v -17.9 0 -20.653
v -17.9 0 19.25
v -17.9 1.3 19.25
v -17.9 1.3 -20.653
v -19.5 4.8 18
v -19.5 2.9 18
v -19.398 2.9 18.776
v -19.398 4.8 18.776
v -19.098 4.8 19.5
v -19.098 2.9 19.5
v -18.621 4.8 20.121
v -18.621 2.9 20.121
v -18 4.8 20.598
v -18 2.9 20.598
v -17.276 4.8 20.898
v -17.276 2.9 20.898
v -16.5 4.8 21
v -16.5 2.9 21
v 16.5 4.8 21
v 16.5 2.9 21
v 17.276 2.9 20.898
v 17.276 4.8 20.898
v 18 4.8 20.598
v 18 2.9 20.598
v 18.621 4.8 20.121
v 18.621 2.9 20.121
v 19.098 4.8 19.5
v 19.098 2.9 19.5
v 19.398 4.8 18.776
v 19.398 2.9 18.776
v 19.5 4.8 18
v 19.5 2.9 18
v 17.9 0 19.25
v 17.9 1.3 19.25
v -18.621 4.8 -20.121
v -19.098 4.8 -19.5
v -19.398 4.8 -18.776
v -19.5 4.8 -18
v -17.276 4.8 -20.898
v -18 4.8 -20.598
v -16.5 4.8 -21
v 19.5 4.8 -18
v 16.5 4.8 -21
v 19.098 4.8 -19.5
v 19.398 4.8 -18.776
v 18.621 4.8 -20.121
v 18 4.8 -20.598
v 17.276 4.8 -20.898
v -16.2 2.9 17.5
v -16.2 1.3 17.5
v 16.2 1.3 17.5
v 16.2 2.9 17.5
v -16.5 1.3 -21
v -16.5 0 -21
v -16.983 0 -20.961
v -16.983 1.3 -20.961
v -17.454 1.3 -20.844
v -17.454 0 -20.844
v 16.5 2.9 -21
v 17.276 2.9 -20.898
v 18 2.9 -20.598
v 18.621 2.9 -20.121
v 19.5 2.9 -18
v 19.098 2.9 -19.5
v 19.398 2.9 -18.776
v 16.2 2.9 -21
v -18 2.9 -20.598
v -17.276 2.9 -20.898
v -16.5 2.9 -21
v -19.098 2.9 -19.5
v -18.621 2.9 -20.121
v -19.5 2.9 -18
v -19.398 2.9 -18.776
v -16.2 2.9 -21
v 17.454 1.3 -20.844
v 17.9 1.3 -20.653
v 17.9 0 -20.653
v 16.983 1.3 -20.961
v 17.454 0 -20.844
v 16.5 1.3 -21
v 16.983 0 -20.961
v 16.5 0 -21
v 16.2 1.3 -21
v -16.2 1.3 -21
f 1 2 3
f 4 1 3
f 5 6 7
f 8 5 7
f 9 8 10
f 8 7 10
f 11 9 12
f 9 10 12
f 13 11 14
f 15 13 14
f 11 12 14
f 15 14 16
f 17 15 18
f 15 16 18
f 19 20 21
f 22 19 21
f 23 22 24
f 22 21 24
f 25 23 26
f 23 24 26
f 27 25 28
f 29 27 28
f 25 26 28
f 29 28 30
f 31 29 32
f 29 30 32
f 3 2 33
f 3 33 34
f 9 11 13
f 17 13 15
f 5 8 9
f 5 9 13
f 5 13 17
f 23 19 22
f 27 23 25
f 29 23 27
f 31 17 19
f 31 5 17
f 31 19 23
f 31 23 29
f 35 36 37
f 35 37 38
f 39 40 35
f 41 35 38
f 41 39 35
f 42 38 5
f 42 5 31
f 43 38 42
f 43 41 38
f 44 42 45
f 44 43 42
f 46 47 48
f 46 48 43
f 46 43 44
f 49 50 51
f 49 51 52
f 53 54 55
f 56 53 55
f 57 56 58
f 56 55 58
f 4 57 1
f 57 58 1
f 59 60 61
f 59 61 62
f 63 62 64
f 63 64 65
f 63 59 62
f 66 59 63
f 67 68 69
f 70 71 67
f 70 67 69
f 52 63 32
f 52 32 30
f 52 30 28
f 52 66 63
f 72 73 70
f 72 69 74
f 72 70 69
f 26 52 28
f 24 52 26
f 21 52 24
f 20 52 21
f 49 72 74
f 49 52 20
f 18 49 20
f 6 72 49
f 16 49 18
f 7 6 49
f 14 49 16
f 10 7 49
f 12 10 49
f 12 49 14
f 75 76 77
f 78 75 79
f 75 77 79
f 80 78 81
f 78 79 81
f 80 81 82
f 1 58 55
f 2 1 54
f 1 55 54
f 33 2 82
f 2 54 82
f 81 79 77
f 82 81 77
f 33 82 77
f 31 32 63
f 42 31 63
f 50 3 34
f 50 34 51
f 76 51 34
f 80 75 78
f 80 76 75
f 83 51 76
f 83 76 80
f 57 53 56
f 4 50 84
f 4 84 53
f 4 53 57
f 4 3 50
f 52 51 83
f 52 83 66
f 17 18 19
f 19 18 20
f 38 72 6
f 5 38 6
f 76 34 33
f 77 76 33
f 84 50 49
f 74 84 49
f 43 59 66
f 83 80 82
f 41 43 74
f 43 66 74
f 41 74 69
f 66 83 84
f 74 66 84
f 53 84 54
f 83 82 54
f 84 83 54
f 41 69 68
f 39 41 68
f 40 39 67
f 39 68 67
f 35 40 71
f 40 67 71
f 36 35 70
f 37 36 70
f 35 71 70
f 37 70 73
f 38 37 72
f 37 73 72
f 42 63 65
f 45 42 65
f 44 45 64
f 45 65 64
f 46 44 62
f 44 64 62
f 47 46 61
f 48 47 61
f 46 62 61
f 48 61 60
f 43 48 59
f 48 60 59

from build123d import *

# Parameters (mm, degrees)
BOSS_EXTRUDE1_DEPTH = 4.8
SKETCH3_W           = 0.3
SKETCH3_H           = 1.6
CUT_EXTRUDE1_DEPTH  = 114.8
CUT_EXTRUDE2_DEPTH  = 114.8


with BuildPart() as part:
    # Sketch2 → Boss-Extrude1 (new body)
    with BuildSketch(Plane(origin=(0, 0, 0), x_dir=(1, 0, 0), z_dir=(0, 1, 0))):
        with BuildLine():
            Line((-16.5, -21), (16.5, -21))
            ThreePointArc((16.5, -21), (18.621320344, -20.121320344), (19.5, -18))
            Line((19.5, -18), (19.5, 18))
            ThreePointArc((19.5, 18), (18.621320344, 20.121320344), (16.5, 21))
            Line((16.5, 21), (-16.5, 21))
            ThreePointArc((-16.5, 21), (-18.621320344, 20.121320344), (-19.5, 18))
            Line((-19.5, 18), (-19.5, -18))
            ThreePointArc((-19.5, -18), (-18.621320344, -20.121320344), (-16.5, -21))
        make_face()
    extrude(amount=BOSS_EXTRUDE1_DEPTH)

    # Sketch3 → Cut-Extrude1 (cut)
    with BuildSketch(Plane.XY.offset(21)):
        Polygon((-16.5, 1.3), (-16.5, 2.9), (-17.9, 2.9), (-19.5, 2.9), (-19.5, 1.3), (-19.5, 0), (-17.9, 0), (-17.9, 1.3), align=None)
        Polygon((17.9, 2.9), (16.5, 2.9), (16.5, 1.3), (17.9, 1.3), (17.9, 0), (19.5, 0), (19.5, 1.3), (19.5, 2.9), align=None)
        with Locations((-16.35, 2.1)):
            Rectangle(SKETCH3_W, SKETCH3_H)
        with Locations((16.35, 2.1)):
            Rectangle(SKETCH3_W, SKETCH3_H)
    extrude(amount=-CUT_EXTRUDE1_DEPTH, mode=Mode.SUBTRACT)

    # Sketch4 → Cut-Extrude2 (cut)
    with BuildSketch(Plane.ZY.offset(19.5)):
        Polygon((17.5, 2.9), (21, 2.9), (21, 1.2), (21, 0), (19.25, 0), (19.25, 1.3), (17.5, 1.3), align=None)
    extrude(amount=-CUT_EXTRUDE2_DEPTH, mode=Mode.SUBTRACT)


solid = part.part
